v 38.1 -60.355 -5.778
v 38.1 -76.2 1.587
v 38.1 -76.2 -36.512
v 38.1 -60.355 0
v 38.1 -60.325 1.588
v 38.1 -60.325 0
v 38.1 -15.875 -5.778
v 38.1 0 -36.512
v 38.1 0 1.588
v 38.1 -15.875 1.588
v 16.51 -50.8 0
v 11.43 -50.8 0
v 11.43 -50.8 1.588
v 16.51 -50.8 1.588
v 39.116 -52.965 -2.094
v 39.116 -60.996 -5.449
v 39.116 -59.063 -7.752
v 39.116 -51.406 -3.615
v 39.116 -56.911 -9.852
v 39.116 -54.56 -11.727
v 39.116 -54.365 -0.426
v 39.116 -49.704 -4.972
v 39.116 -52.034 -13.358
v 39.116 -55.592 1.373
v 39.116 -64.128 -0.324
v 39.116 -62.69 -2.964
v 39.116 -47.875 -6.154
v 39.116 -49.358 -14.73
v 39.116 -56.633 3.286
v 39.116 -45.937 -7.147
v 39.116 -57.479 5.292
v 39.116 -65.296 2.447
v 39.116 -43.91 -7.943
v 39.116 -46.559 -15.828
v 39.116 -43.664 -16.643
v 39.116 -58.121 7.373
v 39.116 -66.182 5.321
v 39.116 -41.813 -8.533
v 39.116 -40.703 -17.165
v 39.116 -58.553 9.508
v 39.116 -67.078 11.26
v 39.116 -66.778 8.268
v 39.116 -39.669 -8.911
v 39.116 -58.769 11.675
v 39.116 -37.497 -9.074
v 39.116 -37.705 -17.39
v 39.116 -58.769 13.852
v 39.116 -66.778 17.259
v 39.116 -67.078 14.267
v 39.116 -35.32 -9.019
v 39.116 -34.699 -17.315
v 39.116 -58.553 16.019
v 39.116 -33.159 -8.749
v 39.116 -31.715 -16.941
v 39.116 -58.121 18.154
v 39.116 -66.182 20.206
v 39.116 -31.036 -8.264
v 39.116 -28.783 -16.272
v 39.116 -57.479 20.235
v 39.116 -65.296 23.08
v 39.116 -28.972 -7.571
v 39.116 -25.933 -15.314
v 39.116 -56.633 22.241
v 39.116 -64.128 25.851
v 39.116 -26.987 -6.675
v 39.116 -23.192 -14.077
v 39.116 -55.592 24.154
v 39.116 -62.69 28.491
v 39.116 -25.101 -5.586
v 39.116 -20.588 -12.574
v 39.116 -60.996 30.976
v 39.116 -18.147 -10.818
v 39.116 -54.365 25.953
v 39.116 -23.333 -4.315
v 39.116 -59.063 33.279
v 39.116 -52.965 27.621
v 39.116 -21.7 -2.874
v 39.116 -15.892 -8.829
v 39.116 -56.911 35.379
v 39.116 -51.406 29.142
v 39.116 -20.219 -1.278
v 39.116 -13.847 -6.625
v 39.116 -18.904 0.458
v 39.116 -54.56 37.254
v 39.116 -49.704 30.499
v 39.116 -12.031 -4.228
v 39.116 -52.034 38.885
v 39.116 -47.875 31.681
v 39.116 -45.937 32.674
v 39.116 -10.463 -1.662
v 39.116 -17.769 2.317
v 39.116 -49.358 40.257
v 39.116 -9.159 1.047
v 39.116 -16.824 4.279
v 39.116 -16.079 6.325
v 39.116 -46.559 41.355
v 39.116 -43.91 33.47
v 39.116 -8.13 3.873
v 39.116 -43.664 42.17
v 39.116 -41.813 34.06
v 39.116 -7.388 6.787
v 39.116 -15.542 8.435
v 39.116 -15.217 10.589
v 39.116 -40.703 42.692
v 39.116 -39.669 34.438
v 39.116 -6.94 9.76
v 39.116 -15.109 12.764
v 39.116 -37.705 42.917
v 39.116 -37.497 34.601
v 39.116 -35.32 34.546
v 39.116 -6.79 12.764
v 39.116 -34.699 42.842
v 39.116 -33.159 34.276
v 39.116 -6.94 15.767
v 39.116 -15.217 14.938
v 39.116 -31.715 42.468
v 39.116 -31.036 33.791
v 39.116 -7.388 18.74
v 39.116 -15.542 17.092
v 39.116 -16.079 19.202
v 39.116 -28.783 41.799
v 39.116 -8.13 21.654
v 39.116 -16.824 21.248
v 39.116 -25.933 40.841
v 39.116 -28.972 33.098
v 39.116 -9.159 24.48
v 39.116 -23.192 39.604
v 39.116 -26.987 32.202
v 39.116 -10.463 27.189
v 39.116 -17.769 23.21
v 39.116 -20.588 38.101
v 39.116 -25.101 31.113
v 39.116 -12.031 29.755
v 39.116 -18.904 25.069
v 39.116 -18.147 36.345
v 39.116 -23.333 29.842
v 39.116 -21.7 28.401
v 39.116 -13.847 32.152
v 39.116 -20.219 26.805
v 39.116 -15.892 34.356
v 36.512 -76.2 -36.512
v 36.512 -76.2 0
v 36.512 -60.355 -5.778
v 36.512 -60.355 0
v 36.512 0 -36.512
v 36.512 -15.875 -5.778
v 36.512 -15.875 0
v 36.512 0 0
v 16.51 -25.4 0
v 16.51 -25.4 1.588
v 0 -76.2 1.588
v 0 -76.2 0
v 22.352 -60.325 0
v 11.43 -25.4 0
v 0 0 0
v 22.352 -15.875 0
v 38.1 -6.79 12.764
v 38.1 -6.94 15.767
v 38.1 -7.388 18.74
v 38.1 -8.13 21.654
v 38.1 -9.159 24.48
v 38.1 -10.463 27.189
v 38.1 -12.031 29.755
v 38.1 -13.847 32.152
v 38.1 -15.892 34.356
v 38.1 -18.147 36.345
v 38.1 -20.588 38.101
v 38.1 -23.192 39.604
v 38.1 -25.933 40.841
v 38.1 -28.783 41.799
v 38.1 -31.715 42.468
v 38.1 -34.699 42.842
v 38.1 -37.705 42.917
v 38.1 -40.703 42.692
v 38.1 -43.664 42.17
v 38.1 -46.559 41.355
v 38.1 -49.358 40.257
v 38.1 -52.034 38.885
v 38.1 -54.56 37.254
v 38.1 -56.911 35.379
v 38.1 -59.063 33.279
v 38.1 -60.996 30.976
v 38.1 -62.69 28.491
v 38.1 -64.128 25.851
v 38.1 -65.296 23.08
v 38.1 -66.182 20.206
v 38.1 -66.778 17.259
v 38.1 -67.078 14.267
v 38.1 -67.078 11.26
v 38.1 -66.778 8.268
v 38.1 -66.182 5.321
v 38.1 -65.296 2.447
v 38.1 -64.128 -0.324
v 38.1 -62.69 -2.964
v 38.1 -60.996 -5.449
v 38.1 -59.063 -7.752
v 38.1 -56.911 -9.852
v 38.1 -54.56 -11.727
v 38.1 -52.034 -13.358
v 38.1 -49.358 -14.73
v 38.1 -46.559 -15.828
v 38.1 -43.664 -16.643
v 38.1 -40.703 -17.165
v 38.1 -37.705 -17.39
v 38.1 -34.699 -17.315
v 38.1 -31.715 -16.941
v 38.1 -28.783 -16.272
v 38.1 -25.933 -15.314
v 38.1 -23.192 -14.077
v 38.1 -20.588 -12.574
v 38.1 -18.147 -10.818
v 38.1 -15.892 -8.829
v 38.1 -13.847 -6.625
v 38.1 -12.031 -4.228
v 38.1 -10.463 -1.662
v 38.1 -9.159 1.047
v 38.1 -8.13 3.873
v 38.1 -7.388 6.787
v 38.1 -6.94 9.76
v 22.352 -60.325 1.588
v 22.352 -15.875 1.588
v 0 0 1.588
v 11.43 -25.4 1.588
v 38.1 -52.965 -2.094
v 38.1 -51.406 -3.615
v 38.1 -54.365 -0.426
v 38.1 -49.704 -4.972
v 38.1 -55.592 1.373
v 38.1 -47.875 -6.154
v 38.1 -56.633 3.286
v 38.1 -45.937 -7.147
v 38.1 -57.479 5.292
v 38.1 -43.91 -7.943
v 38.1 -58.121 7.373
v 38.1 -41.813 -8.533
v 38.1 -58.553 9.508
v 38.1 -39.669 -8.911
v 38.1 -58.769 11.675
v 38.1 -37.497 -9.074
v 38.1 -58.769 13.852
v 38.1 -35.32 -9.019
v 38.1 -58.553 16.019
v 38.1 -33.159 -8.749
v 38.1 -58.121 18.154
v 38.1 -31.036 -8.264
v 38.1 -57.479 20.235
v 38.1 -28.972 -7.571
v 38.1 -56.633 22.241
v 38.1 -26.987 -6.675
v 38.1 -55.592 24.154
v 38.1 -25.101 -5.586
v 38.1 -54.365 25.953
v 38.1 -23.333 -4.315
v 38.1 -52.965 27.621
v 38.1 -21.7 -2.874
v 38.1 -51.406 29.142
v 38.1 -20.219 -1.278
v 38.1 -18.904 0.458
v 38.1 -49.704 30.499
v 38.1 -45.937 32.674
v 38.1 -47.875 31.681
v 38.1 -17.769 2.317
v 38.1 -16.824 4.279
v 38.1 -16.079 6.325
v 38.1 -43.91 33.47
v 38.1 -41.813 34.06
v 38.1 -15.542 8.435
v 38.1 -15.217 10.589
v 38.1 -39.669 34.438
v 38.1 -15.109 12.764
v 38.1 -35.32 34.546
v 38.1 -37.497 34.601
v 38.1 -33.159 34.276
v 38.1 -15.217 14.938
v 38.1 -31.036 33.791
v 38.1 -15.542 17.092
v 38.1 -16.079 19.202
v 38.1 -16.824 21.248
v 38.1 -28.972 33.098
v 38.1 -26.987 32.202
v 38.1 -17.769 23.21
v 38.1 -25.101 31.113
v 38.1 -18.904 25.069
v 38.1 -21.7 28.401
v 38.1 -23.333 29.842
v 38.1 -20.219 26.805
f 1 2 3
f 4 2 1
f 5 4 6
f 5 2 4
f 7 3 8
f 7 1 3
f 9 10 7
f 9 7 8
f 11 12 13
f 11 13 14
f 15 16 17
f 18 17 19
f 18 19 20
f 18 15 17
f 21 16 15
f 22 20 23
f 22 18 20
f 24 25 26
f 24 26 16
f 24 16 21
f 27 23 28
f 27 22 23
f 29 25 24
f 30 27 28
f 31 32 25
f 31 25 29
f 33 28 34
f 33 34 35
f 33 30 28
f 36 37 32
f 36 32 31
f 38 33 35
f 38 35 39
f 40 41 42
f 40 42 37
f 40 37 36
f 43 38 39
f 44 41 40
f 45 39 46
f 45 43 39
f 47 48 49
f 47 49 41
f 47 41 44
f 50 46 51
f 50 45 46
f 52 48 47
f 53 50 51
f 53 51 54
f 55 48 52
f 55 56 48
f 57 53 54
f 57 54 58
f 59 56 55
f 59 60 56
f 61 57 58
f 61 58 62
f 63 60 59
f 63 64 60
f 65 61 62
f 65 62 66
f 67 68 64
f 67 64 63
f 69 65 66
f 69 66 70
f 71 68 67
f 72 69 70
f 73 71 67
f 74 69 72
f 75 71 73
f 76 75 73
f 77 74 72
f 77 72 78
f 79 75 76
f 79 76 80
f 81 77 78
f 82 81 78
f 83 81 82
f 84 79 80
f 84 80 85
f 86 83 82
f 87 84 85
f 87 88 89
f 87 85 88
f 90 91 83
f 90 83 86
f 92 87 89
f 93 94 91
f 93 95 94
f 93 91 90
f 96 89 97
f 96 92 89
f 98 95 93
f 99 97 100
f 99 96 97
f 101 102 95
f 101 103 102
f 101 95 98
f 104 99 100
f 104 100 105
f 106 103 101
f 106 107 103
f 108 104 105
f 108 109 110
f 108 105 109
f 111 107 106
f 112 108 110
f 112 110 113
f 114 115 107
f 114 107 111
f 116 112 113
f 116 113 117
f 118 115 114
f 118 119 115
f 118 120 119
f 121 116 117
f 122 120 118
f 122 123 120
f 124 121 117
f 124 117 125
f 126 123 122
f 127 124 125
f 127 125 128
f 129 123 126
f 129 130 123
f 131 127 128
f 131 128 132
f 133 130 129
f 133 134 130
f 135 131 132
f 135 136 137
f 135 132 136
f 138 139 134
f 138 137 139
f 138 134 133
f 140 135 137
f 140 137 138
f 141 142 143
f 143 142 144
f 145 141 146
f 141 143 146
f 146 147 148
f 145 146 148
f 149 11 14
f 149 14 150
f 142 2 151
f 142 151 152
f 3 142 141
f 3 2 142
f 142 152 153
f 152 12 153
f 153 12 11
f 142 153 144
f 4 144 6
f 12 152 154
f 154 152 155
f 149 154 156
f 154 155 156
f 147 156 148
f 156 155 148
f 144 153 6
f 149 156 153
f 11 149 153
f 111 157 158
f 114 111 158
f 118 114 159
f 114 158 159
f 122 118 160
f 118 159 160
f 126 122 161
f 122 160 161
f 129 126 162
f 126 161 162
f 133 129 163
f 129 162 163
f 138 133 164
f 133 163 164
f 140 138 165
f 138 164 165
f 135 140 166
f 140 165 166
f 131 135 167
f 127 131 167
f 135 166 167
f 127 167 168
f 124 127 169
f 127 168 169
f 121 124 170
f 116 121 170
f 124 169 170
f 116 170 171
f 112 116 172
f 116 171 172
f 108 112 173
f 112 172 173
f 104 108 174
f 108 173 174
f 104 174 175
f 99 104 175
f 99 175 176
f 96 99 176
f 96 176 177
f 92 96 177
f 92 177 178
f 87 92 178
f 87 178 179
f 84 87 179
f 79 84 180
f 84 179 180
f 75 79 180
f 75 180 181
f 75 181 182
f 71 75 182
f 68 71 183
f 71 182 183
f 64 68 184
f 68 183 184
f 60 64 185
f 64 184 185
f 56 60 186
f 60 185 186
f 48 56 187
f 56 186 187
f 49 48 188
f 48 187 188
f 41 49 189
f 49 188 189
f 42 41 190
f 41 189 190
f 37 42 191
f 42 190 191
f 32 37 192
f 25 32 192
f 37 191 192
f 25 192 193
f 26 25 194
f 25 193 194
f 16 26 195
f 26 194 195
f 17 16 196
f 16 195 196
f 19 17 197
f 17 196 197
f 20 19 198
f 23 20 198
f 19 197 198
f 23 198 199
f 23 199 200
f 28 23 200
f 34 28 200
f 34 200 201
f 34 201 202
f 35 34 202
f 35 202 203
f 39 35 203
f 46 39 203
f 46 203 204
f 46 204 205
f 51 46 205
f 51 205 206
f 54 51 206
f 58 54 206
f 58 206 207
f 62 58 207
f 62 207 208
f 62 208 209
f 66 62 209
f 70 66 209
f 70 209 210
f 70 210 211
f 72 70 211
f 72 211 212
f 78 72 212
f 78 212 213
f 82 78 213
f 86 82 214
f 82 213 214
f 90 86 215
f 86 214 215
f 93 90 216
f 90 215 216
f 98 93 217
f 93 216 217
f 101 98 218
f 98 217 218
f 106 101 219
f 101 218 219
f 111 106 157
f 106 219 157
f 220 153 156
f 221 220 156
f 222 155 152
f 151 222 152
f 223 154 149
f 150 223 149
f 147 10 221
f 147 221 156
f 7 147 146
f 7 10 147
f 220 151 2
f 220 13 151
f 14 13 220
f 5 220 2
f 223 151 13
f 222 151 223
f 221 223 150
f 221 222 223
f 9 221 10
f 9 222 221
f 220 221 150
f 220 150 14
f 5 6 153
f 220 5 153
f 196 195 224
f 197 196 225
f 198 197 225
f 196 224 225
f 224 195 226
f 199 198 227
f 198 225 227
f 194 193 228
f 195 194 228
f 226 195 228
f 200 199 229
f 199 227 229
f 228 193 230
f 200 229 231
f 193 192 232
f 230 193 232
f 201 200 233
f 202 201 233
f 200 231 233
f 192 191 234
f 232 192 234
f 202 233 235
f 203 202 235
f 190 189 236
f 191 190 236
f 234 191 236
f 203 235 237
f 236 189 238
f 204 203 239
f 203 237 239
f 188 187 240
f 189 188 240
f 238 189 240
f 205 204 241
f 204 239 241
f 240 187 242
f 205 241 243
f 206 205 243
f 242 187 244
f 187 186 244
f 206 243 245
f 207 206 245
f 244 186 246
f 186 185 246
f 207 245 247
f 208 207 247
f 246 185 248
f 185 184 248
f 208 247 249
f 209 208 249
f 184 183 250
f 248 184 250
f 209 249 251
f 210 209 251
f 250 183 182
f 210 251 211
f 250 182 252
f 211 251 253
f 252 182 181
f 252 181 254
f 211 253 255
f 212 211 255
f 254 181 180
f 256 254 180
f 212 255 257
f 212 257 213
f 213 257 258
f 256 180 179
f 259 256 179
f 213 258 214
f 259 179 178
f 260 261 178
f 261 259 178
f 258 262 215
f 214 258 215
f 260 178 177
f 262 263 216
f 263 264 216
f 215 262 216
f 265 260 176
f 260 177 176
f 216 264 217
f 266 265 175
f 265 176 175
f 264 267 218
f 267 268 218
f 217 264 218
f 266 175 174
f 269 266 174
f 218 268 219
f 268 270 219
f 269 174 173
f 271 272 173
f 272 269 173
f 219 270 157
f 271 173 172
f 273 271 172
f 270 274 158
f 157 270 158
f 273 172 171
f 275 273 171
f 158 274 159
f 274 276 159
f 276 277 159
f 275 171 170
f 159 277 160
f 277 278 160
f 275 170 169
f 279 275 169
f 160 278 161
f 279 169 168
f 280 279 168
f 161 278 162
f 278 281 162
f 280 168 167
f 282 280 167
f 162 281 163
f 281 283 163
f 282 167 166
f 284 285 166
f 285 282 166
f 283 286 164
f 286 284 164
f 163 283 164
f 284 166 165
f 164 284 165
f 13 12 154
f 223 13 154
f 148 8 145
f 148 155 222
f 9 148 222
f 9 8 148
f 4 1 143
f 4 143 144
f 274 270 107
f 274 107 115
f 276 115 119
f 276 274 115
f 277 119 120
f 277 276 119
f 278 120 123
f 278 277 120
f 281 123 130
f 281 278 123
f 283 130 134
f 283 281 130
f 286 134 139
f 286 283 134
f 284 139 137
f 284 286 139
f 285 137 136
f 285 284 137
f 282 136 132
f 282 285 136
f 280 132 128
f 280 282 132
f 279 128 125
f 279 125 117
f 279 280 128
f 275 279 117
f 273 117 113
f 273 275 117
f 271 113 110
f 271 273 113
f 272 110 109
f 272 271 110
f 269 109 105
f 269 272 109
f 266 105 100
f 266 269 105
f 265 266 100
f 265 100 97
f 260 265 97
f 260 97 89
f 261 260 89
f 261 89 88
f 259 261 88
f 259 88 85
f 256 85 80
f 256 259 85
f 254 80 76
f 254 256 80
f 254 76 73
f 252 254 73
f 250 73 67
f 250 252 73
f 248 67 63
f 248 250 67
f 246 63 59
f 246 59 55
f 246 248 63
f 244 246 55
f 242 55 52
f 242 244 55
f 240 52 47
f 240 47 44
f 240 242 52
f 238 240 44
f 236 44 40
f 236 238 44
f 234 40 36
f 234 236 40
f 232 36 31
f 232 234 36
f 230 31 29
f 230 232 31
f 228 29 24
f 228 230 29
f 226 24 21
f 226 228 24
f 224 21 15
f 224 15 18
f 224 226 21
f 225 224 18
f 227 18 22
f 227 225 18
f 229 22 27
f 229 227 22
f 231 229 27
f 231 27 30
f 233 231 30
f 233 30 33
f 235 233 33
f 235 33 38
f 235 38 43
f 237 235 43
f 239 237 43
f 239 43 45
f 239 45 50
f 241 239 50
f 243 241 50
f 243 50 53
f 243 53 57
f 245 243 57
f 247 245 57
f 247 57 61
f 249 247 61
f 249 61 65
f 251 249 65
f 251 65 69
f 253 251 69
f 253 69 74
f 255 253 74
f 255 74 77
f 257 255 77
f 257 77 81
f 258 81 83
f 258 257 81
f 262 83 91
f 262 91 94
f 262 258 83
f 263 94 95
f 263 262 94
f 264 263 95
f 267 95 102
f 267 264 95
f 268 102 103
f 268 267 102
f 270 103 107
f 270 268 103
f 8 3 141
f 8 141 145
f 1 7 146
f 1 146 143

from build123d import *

# Parameters (mm, degrees)
F0_W     = 5.08
F0_H     = 25.4
F1_DEPTH = 1.5875
F3_DEPTH = 1.5875
F4_R     = 30.1625
F4_R_2   = 21.844
F5_DEPTH = 1.016


# Not quite as in the source:
# - a feature names something its author has since deleted; it is built from what else it names


with BuildPart() as f1:
    # F0 (on Top) → F1 (new body)
    with BuildSketch(Plane.XY):
        Polygon((38.1, 0), (0, 0), (0, -76.2), (38.1, -76.2), (38.1, -60.325), (22.352, -60.325), (22.352, -15.875), (38.1, -15.875), align=None)
        with Locations((13.97, -38.1)):
            Rectangle(F0_W, F0_H, mode=Mode.SUBTRACT)
    extrude(amount=F1_DEPTH)

    # F2 (on face) → F3 (join)
    with BuildSketch(Plane.YZ.offset(38.1)):
        Polygon((0, -36.5125), (0, 0), (-15.875, 0), (-15.875, -5.7785), (-60.3550081909, -5.7785), (-60.3550081909, 1.5875), (-76.2, 1.5875), (-76.2, -36.5125), align=None)
    extrude(amount=-F3_DEPTH)


with BuildPart() as f5:
    # F4 (on face) → F5 (new body)
    with BuildSketch(Plane.YZ.offset(38.1)):
        with Locations((-36.9525849819, 12.7635)):
            Circle(F4_R)
        with Locations((-36.9525849819, 12.7635)):
            Circle(F4_R_2, mode=Mode.SUBTRACT)
    extrude(amount=F5_DEPTH)


solid = Compound([f1.part, f5.part])
